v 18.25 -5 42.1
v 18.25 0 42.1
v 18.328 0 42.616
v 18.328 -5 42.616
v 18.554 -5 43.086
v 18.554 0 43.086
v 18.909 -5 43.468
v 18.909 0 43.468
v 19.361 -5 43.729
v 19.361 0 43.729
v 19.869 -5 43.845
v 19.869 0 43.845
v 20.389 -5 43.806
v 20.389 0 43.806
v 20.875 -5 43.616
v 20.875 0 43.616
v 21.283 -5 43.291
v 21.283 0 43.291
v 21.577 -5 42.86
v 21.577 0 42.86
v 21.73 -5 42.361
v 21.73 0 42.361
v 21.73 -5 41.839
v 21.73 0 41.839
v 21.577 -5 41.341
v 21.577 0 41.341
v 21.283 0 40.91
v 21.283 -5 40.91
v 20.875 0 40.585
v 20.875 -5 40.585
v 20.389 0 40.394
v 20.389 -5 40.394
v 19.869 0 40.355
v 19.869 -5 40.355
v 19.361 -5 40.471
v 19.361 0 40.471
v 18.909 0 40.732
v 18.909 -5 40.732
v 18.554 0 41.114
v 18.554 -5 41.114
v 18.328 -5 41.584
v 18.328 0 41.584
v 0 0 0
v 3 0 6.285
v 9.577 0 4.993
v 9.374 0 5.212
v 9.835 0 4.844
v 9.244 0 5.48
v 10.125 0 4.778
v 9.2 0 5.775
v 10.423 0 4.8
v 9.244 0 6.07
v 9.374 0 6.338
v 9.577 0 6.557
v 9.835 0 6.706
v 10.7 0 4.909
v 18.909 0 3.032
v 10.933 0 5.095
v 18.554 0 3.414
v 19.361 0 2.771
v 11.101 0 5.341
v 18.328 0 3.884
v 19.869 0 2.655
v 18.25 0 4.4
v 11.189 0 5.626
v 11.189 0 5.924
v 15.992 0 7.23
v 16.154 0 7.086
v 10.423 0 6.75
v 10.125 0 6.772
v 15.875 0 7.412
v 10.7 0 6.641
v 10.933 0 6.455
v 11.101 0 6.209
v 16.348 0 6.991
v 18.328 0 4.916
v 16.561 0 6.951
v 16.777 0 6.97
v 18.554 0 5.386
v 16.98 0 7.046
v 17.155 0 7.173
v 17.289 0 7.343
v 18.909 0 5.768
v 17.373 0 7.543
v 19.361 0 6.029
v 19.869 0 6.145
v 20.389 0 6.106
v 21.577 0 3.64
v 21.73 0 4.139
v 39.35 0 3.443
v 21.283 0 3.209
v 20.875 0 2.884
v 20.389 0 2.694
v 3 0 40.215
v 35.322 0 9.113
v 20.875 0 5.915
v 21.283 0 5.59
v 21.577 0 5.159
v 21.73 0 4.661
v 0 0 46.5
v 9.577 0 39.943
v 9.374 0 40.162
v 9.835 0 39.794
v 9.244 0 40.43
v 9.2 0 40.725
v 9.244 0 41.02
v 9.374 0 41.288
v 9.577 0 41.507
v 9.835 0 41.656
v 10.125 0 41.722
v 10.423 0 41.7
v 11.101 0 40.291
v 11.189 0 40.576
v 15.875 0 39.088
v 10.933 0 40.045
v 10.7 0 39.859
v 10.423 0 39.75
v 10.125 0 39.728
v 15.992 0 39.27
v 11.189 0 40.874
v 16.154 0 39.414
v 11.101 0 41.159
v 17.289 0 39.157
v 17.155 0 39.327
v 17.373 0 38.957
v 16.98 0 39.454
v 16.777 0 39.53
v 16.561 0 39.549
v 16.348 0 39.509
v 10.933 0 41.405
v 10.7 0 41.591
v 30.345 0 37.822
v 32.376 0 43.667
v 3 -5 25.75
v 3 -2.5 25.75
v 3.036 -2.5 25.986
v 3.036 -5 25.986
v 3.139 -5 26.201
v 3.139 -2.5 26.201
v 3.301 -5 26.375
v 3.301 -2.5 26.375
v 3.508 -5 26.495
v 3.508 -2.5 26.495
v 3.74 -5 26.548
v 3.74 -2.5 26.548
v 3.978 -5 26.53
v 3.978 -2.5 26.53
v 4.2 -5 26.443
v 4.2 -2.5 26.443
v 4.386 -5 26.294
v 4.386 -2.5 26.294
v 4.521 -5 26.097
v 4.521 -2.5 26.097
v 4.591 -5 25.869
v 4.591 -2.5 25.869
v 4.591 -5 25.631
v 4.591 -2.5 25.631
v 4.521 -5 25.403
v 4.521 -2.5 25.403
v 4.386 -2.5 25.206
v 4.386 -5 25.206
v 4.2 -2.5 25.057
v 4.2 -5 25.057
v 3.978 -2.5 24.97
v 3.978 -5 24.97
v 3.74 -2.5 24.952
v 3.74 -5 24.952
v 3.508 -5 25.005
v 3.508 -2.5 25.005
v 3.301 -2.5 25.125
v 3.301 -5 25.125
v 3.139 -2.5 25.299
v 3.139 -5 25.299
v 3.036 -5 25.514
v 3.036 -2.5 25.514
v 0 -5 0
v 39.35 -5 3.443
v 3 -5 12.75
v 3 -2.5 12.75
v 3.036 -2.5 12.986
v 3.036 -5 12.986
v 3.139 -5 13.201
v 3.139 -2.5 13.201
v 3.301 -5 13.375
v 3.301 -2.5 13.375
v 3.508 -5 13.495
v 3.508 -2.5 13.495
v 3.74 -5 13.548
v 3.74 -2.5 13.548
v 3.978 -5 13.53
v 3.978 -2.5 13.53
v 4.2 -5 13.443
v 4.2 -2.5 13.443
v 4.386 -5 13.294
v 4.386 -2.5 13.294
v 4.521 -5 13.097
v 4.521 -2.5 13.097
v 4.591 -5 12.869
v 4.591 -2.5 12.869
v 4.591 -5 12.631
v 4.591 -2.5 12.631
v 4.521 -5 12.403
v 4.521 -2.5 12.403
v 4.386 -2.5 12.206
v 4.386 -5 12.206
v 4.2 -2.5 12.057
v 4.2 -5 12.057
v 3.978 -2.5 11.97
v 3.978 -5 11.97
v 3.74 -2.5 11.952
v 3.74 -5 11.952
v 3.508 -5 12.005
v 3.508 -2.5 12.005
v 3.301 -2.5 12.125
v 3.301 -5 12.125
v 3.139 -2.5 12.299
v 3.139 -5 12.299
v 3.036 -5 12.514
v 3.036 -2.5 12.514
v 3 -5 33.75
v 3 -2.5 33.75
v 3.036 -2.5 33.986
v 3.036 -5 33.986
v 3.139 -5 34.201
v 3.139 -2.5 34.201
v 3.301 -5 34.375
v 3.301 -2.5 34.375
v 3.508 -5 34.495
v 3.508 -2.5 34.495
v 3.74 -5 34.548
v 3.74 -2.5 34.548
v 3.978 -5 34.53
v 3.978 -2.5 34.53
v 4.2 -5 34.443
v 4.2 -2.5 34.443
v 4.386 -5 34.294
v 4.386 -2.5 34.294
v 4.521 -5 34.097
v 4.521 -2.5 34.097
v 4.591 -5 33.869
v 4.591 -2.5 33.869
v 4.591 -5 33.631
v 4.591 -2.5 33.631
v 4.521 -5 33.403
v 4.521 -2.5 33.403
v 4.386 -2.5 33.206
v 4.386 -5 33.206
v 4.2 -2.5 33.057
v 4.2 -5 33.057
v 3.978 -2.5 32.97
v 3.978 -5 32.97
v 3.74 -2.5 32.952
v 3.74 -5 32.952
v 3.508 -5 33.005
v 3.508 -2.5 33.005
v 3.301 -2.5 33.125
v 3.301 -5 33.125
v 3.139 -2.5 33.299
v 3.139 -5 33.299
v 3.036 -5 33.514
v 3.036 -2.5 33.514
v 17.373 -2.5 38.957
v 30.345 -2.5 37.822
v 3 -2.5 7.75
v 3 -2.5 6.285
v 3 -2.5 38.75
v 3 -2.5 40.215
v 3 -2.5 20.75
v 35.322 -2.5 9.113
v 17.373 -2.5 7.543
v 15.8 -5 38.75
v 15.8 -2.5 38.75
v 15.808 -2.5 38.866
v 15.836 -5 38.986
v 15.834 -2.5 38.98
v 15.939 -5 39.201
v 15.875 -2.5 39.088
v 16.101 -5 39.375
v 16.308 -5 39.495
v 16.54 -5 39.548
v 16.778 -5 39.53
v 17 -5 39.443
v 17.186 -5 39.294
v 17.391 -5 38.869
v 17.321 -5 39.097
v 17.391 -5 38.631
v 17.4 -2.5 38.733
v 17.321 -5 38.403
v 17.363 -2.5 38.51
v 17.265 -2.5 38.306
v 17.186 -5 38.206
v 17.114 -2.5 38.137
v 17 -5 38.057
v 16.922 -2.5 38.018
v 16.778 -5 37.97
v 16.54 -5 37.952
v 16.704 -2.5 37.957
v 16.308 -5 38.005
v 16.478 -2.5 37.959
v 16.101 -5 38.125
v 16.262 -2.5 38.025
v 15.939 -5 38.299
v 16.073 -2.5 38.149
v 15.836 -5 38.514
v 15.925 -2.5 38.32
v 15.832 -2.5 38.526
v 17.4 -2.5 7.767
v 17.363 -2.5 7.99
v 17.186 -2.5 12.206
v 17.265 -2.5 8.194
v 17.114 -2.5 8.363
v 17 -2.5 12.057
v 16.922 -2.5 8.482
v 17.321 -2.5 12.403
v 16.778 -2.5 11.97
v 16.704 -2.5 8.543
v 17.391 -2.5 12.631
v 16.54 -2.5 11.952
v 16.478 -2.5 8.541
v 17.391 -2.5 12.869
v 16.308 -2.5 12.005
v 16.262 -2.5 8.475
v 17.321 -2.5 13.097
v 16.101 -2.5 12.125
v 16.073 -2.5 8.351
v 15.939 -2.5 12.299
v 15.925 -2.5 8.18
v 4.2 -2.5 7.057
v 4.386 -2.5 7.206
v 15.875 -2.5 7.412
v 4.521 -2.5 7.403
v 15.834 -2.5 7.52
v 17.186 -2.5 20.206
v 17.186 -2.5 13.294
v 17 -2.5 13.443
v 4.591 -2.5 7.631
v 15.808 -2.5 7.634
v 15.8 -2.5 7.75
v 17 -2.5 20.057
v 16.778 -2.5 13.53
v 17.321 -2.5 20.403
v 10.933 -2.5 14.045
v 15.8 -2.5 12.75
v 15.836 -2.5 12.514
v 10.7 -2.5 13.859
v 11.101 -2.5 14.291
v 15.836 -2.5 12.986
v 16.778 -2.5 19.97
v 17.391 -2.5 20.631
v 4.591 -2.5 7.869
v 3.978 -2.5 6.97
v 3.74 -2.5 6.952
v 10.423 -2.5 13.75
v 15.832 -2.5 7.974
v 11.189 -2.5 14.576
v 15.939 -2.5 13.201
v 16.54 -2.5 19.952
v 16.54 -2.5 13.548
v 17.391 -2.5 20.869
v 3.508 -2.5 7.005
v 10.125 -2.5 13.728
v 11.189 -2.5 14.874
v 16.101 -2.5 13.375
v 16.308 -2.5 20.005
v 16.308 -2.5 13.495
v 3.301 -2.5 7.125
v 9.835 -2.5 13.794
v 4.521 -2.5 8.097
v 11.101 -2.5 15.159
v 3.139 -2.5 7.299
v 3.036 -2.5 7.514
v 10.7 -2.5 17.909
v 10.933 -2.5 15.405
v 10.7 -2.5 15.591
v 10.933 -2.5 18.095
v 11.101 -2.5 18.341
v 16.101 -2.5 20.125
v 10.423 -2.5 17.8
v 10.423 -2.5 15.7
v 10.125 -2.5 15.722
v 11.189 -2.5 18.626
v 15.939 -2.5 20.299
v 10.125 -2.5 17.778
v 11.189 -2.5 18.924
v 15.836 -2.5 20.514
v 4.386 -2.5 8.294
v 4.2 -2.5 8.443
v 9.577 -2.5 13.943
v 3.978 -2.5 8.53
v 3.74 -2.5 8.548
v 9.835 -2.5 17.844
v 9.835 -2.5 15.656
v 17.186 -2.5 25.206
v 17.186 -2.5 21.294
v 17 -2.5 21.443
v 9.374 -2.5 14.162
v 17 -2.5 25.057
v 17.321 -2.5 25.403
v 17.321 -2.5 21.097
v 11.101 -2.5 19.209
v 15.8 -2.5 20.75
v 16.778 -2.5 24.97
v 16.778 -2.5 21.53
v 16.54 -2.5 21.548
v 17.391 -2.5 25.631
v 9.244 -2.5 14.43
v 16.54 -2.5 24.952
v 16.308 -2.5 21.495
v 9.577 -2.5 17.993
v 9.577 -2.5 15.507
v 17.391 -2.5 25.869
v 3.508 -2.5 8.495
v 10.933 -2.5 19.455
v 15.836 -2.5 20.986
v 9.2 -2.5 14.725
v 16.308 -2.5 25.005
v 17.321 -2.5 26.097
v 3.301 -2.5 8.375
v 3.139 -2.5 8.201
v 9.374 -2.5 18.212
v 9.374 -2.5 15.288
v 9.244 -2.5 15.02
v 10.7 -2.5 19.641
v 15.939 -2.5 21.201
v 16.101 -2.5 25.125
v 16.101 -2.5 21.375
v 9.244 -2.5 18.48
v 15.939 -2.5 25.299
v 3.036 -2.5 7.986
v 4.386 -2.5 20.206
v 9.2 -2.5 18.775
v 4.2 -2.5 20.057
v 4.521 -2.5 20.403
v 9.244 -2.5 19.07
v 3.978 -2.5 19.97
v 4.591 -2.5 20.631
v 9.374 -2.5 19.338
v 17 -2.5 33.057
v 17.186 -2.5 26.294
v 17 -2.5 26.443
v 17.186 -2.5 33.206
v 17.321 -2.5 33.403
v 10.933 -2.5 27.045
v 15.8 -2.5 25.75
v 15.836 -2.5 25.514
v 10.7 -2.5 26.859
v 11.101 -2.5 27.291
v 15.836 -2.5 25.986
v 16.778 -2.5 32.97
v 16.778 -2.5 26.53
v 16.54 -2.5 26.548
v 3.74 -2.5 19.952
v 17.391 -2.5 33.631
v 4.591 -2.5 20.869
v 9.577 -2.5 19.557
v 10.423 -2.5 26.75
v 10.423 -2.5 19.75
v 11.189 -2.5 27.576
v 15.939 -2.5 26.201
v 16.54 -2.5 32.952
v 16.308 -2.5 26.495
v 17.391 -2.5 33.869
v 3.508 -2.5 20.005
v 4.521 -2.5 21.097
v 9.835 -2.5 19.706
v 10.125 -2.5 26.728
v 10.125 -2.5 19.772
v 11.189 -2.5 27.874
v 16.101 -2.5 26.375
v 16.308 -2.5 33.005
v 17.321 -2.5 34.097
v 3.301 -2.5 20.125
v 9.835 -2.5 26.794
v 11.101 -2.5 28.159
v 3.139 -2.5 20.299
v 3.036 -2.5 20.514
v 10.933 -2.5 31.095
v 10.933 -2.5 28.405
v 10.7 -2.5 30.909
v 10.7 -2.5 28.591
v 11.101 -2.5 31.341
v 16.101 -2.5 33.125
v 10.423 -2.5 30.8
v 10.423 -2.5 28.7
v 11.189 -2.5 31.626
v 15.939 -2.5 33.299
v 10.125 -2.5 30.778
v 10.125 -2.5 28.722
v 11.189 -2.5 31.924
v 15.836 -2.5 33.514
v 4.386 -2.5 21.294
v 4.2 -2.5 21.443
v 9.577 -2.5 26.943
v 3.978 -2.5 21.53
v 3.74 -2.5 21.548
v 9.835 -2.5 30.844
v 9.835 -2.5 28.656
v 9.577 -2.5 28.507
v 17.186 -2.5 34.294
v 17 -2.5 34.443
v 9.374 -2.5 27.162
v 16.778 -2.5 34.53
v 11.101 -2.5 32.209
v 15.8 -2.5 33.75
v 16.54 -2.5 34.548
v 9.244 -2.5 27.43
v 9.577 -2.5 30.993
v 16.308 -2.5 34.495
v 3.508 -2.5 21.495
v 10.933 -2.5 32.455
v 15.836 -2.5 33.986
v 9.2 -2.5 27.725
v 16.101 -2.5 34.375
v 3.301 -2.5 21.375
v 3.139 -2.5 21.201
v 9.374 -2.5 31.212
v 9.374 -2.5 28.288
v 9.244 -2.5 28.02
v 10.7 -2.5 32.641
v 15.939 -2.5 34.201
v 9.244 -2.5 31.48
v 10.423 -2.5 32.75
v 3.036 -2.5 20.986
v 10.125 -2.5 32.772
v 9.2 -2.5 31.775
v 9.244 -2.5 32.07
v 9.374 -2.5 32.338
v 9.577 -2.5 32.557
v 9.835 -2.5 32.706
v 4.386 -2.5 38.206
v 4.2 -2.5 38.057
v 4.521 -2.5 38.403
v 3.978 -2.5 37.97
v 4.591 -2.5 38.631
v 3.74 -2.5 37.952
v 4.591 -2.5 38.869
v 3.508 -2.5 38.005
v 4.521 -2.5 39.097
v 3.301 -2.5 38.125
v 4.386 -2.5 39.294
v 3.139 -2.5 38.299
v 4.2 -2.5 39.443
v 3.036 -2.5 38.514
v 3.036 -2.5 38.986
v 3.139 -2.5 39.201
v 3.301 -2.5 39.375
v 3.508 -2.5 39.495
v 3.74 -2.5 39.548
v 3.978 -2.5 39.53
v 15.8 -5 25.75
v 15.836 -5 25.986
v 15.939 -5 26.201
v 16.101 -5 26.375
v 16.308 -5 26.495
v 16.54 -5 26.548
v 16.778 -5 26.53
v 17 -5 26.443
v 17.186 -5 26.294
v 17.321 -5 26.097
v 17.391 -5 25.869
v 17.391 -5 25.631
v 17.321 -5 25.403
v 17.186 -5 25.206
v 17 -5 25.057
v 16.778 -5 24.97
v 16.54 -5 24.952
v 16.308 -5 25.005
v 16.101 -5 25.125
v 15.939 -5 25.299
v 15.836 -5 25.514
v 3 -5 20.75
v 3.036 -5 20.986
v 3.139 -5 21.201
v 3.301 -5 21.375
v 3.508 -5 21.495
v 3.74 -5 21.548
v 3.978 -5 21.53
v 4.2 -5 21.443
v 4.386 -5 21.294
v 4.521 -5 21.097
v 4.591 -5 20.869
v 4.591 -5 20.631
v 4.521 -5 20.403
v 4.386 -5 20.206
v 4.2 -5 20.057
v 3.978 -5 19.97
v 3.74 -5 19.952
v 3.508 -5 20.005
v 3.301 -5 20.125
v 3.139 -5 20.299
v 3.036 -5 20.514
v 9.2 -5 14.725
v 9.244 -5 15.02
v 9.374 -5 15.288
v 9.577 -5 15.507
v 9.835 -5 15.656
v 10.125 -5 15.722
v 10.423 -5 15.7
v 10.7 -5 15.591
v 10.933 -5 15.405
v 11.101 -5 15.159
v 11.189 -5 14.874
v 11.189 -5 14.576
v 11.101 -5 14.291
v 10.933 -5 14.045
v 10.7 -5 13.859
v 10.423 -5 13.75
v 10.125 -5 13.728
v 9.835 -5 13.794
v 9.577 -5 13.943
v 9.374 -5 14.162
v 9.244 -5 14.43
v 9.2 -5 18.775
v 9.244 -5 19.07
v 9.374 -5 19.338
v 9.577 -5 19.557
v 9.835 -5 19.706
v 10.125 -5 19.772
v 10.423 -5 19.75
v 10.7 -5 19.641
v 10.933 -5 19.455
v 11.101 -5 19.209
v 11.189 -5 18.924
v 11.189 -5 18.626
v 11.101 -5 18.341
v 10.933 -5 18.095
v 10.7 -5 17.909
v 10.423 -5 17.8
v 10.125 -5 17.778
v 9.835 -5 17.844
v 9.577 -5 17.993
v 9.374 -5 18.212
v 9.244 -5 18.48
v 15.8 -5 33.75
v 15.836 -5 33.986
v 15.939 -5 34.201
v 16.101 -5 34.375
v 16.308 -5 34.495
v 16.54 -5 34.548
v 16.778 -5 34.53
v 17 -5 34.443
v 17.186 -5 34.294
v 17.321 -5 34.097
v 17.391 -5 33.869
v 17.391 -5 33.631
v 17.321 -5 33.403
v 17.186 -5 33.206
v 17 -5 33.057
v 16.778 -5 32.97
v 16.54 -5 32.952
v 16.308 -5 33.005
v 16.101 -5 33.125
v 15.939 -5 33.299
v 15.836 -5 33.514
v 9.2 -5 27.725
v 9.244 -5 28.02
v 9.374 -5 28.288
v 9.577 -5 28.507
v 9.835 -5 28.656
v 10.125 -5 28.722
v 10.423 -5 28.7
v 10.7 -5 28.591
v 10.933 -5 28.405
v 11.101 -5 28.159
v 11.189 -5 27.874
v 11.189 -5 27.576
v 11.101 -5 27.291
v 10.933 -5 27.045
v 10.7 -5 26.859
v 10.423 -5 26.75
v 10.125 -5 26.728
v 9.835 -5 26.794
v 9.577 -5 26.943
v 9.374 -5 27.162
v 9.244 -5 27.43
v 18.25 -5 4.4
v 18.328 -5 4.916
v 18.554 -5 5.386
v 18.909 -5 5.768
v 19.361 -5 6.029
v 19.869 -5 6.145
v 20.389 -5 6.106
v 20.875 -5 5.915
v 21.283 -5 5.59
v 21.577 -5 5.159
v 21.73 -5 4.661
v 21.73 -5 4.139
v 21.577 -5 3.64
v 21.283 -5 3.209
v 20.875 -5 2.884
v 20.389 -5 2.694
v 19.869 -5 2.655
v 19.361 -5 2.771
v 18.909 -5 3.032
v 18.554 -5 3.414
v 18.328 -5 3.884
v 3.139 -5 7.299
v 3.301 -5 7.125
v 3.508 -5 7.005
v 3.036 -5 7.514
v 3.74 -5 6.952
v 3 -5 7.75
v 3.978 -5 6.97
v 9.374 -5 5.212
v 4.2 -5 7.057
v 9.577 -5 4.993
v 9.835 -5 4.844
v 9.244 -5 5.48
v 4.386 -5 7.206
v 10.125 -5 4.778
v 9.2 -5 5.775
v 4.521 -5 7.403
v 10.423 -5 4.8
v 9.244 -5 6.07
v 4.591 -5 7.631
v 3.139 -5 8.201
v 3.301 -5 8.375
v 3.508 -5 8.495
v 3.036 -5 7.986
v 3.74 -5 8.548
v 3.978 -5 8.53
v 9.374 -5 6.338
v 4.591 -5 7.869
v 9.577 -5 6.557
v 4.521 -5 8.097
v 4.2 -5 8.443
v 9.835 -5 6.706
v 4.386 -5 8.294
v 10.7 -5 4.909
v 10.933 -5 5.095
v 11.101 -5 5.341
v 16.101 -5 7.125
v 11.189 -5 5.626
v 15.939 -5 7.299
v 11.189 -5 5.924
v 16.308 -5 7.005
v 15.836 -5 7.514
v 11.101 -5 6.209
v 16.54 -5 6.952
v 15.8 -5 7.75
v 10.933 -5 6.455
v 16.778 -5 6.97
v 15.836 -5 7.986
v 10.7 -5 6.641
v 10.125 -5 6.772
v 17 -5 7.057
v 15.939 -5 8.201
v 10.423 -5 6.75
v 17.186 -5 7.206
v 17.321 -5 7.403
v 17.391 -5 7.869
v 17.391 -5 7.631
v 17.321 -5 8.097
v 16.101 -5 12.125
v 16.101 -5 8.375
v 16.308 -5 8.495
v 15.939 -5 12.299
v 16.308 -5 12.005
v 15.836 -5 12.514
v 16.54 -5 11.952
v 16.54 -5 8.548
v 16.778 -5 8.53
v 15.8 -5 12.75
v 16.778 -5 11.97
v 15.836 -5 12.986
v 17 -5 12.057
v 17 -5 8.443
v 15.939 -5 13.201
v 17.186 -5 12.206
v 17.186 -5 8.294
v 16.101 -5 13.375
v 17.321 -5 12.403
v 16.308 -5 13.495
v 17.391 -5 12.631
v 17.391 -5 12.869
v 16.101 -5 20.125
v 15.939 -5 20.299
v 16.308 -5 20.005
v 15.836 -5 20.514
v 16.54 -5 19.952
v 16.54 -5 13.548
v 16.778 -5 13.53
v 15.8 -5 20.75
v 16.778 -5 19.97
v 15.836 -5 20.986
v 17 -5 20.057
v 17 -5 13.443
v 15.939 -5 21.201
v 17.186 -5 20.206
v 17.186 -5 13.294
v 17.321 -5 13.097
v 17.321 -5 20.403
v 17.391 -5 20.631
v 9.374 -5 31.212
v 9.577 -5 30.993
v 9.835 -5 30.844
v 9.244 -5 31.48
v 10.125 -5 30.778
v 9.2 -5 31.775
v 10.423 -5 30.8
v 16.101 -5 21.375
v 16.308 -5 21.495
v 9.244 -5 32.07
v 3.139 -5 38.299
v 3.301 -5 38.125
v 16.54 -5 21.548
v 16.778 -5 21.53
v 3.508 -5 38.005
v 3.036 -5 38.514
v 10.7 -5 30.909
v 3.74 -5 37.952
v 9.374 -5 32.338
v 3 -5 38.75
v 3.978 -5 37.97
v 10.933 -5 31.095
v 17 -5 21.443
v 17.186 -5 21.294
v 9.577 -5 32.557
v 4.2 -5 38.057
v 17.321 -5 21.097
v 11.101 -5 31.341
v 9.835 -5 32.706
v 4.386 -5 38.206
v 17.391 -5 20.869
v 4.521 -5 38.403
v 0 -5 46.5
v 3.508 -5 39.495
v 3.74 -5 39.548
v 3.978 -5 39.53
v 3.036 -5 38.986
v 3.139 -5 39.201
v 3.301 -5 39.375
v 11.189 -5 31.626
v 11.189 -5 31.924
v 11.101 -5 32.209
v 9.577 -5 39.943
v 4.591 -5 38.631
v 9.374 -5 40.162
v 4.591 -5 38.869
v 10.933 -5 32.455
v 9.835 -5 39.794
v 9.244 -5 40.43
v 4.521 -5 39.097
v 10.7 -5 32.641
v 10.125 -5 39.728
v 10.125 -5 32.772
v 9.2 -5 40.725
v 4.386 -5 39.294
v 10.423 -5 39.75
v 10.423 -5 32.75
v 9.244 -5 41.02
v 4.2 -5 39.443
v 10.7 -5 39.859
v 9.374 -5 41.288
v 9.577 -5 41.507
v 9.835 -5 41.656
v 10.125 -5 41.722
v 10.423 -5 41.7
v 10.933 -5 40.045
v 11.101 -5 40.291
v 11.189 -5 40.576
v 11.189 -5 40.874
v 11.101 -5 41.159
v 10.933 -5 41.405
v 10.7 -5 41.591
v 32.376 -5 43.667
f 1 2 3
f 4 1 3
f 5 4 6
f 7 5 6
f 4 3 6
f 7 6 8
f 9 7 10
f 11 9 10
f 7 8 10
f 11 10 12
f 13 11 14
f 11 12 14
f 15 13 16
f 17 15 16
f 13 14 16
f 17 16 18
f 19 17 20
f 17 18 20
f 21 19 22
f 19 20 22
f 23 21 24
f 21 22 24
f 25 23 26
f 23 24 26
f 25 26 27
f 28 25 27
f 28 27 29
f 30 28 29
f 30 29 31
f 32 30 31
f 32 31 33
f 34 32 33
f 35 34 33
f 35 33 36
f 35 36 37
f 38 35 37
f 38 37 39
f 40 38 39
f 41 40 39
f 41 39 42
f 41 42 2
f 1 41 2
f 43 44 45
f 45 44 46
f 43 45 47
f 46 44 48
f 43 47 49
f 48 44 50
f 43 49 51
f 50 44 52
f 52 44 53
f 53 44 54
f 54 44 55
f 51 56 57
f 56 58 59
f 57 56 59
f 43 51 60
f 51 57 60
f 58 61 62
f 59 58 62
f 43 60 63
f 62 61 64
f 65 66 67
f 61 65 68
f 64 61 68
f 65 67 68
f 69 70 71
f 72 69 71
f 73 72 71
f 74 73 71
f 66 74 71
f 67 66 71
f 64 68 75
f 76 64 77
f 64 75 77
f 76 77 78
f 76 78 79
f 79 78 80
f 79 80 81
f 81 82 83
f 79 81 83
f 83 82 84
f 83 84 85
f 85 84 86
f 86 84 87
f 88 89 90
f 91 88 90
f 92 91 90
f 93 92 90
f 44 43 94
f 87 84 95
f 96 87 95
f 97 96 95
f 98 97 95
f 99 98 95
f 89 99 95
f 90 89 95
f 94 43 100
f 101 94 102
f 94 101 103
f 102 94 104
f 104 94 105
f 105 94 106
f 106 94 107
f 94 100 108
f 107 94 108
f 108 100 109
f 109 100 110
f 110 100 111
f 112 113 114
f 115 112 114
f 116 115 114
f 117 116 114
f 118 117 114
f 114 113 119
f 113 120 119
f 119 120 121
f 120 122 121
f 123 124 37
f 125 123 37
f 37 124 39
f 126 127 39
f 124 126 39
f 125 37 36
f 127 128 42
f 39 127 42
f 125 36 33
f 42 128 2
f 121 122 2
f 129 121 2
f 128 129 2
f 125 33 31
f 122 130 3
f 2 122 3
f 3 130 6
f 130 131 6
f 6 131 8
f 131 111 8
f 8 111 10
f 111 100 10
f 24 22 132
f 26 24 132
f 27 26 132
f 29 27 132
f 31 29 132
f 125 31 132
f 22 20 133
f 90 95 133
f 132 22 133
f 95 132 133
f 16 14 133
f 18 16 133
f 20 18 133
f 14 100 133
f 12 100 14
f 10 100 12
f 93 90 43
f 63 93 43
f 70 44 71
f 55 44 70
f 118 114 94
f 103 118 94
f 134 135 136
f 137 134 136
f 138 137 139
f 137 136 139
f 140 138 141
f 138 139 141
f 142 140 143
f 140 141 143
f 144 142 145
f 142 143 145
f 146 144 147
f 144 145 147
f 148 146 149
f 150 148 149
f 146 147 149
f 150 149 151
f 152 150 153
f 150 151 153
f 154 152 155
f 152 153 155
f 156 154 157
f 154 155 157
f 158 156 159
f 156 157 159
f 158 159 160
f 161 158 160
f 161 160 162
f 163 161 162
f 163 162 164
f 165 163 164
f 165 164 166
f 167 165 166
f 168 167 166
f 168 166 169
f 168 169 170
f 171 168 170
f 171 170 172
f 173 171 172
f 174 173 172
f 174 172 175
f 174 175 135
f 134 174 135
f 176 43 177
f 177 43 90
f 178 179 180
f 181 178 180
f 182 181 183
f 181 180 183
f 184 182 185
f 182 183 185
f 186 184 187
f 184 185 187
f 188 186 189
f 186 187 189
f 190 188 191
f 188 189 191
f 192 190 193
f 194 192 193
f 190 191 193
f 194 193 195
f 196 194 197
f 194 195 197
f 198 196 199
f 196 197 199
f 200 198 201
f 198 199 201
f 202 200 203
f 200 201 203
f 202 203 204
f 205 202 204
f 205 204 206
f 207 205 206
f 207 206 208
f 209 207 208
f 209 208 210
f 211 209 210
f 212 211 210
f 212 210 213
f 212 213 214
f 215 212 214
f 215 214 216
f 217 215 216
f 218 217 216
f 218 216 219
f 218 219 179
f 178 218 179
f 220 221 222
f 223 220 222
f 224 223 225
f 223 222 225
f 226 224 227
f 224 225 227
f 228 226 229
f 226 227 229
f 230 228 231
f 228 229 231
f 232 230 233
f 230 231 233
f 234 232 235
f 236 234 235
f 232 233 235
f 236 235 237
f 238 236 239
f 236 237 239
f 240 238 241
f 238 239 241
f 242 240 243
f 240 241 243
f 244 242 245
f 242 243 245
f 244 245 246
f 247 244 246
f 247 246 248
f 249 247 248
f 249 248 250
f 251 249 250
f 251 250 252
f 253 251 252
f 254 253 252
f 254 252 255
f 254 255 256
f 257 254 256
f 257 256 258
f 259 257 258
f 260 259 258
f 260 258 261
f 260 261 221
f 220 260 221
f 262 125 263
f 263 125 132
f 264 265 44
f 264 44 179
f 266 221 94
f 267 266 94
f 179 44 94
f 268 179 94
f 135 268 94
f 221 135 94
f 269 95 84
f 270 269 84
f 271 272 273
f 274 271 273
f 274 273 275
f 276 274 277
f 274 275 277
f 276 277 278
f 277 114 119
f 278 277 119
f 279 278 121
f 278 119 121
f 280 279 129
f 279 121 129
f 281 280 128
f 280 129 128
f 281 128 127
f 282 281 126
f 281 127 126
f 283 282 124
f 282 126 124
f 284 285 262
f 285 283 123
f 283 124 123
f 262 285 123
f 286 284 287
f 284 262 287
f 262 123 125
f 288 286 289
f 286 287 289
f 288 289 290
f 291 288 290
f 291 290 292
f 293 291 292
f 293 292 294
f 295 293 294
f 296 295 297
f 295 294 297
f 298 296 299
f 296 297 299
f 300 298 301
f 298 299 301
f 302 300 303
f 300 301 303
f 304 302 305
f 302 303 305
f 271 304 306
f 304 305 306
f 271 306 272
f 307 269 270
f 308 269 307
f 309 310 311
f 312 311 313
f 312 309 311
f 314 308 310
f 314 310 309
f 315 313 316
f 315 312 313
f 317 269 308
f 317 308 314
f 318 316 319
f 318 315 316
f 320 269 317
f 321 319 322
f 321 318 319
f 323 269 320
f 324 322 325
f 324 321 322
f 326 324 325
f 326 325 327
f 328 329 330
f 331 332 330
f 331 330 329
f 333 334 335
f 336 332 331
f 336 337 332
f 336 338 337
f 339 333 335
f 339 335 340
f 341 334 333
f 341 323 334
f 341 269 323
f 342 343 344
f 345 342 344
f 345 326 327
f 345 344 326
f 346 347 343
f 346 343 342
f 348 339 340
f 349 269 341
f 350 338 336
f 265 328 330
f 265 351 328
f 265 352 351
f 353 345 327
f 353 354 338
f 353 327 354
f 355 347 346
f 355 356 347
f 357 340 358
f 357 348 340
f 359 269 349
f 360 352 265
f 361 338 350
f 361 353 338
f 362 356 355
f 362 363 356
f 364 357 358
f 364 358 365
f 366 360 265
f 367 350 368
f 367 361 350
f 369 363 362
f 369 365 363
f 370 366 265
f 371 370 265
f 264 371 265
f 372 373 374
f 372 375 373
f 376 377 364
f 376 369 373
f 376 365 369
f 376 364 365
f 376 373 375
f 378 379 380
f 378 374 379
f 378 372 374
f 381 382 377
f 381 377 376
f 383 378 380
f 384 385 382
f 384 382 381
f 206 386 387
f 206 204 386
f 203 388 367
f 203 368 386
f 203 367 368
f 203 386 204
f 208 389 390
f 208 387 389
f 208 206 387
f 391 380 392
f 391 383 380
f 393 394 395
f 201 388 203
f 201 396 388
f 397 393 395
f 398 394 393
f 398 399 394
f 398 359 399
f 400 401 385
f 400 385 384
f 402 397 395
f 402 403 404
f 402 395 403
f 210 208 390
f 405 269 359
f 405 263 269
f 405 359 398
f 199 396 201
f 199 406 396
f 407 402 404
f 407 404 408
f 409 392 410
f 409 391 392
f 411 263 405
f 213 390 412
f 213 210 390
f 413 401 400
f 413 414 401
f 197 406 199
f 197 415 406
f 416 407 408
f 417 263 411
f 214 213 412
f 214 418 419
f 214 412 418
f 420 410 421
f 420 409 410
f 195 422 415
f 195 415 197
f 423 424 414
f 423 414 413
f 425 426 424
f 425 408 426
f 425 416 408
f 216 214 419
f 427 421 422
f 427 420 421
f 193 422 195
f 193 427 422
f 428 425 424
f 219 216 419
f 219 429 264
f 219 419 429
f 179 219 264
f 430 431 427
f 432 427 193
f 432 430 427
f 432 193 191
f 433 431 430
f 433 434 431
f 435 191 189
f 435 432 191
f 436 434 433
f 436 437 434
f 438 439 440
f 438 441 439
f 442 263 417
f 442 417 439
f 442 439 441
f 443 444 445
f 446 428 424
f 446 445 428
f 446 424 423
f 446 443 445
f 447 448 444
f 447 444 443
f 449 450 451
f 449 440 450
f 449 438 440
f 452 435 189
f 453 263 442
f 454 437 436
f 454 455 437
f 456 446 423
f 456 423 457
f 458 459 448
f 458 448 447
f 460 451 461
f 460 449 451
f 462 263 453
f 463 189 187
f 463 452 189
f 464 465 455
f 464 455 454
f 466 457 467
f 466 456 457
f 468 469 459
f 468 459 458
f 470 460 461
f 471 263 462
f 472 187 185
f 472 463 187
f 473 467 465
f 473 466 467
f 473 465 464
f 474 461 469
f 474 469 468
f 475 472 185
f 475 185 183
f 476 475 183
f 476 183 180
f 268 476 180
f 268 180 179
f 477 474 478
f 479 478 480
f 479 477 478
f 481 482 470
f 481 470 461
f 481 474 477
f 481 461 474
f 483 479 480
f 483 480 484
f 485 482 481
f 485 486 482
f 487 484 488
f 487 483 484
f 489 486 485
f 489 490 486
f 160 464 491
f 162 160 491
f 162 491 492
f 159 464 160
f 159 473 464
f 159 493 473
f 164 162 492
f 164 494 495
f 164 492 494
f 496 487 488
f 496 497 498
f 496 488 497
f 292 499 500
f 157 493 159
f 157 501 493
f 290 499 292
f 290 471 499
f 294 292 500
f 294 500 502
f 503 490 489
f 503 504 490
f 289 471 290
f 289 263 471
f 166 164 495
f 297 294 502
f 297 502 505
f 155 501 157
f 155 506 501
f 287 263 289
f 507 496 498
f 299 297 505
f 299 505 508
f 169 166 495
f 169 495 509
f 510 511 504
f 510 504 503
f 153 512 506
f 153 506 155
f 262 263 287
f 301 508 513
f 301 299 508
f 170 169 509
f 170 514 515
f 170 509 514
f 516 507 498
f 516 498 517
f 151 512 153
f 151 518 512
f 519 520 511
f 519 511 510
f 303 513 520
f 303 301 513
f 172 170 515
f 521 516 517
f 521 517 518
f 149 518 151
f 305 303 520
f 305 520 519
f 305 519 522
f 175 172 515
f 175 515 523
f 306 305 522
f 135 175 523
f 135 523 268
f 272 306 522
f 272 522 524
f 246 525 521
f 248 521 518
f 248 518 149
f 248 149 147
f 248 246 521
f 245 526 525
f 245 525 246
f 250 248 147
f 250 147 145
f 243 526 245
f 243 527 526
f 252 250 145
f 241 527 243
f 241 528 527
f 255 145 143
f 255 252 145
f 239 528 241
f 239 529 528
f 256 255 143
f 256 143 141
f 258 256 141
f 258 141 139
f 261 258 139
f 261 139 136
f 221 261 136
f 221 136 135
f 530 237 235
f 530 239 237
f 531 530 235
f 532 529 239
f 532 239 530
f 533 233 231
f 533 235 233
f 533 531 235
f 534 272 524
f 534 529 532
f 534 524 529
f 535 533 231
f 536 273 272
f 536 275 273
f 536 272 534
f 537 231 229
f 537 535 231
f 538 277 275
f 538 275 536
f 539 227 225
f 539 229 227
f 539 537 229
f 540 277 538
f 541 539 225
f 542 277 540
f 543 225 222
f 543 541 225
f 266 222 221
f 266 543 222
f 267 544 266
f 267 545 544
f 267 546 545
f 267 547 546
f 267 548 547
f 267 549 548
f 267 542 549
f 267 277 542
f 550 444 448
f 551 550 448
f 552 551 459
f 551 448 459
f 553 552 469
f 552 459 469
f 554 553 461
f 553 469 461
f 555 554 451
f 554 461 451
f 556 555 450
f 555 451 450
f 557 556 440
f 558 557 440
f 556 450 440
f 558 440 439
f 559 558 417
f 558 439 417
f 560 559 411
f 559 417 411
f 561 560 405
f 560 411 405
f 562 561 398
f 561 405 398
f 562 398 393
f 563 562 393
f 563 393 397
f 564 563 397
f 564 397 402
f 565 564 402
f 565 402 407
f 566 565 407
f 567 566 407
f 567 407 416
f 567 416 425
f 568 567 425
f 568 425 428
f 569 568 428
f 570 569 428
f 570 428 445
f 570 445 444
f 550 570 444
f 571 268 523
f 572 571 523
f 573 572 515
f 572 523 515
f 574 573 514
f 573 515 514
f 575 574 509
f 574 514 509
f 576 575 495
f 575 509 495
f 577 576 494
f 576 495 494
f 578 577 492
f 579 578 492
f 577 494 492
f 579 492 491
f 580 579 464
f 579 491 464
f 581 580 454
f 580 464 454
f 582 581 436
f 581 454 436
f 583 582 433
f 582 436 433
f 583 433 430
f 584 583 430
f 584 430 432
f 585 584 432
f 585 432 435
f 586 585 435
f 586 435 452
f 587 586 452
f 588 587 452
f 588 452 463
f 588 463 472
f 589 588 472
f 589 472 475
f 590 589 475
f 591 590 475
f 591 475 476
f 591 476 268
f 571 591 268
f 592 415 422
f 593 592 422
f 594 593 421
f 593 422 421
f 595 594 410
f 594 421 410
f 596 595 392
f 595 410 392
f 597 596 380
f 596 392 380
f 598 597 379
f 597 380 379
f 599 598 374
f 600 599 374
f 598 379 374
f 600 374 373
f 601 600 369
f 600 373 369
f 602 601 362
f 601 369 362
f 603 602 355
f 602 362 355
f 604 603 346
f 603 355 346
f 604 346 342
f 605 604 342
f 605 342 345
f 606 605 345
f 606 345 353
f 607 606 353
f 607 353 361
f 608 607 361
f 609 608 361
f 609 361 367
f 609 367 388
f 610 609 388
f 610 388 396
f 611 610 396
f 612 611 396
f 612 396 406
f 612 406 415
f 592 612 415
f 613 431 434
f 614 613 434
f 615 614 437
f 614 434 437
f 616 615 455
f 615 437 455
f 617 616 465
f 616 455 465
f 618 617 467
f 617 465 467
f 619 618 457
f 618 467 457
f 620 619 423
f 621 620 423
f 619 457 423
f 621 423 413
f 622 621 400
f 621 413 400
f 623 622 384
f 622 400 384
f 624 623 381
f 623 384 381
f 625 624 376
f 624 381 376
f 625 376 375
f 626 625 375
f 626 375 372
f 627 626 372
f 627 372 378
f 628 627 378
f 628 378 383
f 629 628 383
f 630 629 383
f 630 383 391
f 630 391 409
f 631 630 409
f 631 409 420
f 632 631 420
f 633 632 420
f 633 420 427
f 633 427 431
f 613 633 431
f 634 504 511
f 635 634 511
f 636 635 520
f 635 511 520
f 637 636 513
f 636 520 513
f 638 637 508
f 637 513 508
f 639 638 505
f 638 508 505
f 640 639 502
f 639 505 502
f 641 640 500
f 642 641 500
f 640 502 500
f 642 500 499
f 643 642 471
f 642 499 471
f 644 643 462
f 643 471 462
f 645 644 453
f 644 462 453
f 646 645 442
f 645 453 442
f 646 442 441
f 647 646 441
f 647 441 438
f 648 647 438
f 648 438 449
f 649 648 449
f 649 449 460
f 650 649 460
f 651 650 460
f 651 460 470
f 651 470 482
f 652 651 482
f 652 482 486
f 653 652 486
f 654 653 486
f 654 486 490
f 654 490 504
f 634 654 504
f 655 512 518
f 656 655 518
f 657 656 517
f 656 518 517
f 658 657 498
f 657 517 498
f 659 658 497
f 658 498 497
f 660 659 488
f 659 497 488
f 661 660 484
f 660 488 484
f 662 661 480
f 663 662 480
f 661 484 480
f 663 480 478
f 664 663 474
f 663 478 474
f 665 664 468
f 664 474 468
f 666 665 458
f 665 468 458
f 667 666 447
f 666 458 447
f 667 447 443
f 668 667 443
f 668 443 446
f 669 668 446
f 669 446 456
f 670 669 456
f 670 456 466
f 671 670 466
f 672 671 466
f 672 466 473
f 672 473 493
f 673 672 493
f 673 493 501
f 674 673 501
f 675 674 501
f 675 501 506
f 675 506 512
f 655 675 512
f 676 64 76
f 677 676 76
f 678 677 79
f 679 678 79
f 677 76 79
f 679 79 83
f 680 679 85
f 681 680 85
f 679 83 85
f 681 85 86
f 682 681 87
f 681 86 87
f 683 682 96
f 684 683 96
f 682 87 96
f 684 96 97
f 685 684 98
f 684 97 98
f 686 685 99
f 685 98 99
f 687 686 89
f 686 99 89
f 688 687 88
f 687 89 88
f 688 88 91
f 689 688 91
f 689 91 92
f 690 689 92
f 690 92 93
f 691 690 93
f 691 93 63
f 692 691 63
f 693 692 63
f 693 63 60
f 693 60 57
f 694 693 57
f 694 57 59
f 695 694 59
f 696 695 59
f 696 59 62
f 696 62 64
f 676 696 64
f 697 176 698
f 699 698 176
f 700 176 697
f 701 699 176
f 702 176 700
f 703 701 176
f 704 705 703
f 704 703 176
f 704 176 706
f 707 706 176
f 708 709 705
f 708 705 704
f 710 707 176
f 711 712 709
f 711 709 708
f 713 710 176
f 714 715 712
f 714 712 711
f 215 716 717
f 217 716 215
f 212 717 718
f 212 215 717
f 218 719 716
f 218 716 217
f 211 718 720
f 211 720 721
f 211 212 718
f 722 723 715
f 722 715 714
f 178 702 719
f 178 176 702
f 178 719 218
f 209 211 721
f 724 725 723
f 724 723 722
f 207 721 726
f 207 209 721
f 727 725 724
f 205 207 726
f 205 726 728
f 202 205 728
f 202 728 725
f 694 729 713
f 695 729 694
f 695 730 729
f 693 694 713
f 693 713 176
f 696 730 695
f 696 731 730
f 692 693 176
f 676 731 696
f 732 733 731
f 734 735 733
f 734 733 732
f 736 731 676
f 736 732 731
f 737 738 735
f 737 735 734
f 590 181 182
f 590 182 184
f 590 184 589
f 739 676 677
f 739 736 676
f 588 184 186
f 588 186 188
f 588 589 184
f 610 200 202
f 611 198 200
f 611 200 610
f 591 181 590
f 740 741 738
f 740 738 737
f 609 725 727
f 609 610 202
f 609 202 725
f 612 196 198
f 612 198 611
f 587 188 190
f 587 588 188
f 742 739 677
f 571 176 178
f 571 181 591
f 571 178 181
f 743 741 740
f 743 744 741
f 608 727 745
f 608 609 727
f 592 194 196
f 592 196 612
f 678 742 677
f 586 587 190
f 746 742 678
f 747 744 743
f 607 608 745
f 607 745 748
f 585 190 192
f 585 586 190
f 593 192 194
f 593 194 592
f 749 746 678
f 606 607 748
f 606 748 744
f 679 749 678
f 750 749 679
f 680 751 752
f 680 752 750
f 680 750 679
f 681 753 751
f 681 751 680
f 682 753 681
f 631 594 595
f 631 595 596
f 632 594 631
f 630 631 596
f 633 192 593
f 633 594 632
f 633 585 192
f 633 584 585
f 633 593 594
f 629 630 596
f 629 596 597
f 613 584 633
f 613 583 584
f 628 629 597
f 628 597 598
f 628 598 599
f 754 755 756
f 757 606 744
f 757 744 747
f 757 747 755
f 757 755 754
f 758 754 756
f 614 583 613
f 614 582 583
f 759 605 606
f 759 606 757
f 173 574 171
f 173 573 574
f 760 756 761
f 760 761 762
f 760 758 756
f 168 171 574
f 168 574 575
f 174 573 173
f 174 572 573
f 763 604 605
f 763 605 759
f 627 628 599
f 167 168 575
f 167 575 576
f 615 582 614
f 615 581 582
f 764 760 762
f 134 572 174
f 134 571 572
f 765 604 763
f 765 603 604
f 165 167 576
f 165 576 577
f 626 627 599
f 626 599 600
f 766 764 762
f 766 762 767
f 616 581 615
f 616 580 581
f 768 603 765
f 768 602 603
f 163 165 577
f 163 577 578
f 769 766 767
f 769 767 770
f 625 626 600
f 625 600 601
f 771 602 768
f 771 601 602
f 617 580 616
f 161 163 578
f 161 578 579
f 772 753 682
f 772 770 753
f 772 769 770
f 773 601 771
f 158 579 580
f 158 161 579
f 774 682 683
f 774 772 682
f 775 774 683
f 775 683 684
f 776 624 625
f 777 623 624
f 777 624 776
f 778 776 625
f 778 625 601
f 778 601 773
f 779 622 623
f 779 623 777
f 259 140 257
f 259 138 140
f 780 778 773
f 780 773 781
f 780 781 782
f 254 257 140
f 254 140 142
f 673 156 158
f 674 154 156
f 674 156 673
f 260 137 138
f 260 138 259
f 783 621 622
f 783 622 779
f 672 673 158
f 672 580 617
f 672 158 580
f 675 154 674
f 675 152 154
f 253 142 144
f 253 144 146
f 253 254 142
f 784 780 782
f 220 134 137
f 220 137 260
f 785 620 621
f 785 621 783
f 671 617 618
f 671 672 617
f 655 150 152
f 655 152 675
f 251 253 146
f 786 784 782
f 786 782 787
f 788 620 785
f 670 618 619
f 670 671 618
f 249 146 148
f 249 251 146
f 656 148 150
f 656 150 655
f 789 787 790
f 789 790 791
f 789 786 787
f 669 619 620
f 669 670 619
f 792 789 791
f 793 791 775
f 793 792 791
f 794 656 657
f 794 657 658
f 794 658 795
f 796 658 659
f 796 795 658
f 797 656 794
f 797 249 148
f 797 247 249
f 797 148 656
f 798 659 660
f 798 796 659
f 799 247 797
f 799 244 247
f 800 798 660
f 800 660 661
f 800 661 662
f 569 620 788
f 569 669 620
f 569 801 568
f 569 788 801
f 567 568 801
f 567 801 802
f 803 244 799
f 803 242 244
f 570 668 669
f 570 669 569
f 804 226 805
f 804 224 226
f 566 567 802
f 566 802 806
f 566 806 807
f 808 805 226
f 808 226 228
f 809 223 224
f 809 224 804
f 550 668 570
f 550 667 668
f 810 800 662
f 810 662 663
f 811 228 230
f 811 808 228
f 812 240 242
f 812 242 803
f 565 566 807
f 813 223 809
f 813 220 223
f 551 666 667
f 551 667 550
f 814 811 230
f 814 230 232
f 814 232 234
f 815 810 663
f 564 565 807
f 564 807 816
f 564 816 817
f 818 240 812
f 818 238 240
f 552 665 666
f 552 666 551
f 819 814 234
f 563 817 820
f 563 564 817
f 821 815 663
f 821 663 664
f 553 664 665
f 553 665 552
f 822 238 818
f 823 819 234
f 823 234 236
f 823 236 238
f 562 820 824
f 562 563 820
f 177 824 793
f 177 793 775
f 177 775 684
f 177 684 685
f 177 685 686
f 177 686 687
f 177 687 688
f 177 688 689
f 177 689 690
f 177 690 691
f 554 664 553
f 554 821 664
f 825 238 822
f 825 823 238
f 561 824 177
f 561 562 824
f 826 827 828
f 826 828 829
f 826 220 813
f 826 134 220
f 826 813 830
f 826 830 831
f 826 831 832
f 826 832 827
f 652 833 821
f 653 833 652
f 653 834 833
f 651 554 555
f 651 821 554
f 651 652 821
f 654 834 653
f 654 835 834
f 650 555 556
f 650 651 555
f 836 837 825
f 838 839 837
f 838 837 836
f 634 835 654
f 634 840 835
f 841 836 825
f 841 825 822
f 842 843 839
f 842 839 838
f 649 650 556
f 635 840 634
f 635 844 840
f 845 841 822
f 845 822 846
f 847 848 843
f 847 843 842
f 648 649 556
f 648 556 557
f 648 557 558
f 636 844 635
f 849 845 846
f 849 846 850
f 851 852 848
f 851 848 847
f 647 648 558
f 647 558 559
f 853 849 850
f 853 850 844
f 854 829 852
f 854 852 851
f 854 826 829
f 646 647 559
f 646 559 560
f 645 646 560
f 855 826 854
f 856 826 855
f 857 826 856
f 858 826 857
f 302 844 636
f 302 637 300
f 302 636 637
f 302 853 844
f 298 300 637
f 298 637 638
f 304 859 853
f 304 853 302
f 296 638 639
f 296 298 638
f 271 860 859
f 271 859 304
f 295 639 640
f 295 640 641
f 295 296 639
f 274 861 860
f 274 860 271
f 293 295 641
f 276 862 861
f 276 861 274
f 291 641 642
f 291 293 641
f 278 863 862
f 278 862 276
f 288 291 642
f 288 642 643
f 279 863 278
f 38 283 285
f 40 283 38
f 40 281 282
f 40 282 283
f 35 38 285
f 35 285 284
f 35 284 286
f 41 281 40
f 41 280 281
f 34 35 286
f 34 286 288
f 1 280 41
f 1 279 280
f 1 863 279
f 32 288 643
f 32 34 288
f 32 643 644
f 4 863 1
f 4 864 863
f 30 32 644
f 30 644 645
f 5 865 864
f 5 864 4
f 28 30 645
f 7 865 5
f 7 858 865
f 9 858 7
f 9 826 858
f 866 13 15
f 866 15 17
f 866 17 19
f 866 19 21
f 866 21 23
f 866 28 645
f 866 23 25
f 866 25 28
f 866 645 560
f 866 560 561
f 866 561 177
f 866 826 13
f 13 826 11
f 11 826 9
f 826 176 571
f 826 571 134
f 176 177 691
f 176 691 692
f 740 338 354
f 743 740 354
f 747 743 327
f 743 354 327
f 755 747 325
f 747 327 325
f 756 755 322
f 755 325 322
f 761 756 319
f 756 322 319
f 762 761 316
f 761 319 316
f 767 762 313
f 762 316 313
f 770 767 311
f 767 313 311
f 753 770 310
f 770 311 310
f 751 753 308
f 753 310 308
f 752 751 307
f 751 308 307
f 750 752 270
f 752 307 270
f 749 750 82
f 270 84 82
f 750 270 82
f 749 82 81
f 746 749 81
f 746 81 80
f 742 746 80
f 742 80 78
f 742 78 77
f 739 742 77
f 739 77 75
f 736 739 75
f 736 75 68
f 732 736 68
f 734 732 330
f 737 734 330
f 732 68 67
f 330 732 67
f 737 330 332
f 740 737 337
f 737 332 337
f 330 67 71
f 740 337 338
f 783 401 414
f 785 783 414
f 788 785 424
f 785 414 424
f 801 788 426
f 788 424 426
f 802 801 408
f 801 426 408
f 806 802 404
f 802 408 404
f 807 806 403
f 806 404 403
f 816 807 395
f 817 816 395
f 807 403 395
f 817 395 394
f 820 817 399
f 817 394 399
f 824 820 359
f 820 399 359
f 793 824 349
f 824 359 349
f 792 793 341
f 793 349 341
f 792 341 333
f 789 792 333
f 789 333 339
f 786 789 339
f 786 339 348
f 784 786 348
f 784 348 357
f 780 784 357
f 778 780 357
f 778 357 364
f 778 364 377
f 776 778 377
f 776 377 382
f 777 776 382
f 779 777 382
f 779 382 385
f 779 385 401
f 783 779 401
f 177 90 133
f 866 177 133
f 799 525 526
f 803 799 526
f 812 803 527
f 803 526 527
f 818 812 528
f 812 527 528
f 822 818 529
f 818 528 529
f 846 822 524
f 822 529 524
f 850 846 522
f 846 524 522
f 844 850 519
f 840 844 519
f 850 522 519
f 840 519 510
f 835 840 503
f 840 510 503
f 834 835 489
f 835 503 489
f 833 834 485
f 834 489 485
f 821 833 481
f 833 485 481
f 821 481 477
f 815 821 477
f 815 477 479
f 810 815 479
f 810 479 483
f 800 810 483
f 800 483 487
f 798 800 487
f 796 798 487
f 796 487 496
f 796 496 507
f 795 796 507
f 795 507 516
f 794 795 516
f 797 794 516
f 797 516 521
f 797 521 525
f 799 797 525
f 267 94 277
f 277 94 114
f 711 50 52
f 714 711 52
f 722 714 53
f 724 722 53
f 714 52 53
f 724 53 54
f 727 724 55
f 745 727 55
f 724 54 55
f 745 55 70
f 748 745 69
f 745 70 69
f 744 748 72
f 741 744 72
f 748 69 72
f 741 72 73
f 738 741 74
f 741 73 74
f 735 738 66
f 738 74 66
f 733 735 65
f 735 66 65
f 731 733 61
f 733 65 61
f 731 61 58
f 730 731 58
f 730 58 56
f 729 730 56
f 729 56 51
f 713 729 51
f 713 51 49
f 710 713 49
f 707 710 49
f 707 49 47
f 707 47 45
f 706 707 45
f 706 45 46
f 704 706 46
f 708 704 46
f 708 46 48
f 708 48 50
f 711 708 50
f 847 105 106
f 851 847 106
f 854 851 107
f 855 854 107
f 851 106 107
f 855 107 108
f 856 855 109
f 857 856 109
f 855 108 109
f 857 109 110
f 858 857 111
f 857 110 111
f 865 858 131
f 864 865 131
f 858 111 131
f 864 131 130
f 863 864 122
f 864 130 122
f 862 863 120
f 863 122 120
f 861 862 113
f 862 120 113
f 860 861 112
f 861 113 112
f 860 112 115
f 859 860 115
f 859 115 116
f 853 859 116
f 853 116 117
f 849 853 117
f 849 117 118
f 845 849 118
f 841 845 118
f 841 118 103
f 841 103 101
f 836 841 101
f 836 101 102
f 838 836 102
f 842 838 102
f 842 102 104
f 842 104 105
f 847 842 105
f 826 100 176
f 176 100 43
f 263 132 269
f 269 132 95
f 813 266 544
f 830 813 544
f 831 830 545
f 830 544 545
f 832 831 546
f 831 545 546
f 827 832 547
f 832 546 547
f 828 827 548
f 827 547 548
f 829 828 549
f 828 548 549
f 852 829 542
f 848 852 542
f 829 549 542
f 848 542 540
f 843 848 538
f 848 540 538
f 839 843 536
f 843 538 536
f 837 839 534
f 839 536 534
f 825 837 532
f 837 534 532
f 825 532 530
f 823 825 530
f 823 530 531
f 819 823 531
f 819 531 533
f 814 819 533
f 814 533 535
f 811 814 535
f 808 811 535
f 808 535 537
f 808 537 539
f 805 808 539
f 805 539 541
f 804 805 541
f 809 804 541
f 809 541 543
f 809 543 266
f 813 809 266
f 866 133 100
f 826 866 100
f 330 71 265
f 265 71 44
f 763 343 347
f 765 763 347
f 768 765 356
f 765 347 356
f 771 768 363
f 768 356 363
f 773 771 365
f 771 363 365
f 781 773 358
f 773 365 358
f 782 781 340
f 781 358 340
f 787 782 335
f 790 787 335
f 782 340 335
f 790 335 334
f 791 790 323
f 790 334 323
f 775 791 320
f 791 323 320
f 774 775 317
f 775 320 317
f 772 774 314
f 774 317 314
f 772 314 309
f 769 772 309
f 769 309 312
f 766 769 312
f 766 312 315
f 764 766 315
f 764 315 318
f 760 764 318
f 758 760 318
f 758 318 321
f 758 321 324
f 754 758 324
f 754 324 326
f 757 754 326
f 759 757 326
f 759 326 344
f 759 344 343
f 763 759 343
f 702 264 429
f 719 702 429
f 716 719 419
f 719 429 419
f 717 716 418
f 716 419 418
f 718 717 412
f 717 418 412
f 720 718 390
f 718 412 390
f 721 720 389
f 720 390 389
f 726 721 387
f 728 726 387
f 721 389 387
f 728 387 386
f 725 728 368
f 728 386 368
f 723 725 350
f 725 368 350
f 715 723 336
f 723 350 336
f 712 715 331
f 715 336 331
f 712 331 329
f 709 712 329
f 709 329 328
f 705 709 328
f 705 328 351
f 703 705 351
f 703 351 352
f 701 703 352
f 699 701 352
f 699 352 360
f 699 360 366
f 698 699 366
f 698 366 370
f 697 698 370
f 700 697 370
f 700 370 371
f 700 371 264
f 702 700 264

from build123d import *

# Parameters (mm, degrees)
F1_DEPTH = 5
F3_DEPTH = 2.5
F5_D     = 3.5
F6_D     = 1.6
F7_D     = 2


with BuildPart() as f1:
    # F0 (on Front) → F1 (new body)
    with BuildSketch(Plane.XZ):
        Polygon((32.376328, 43.667438), (0, 46.5), (0, 0), (39.349691, 3.442652), align=None)
    extrude(amount=F1_DEPTH)

    # F2 (on face) → F3 (cut)
    with BuildSketch(Plane(origin=(0, 0, 0), x_dir=(-1, 0, 0), z_dir=(0, 1, 0))):
        Polygon((-3, 40.214615), (-30.344903, 37.822246), (-35.321901, 9.113185), (-3, 6.285385), align=None)
    extrude(amount=-F3_DEPTH, mode=Mode.SUBTRACT)

    # F5 (through all)
    with Locations(Plane.XZ.offset(5)):
        with Locations((20, 4.399773), (20, 42.100227)):
            Hole(F5_D / 2)

    # F6 (through all)
    with Locations(Plane.XZ.offset(5)):
        with Locations((3.8, 7.75), (3.8, 12.75), (3.8, 20.75), (3.8, 25.75), (3.8, 33.75), (3.8, 38.75), (16.6, 38.75), (16.6, 33.75), (16.6, 25.75), (16.6, 20.75), (16.6, 12.75), (16.6, 7.75)):
            Hole(F6_D / 2)

    # F7 (through all)
    with Locations(Plane.XZ.offset(5)):
        with Locations((10.2, 5.775), (10.2, 14.725), (10.2, 18.775), (10.2, 27.725), (10.2, 31.775), (10.2, 40.725)):
            Hole(F7_D / 2)


solid = f1.part
